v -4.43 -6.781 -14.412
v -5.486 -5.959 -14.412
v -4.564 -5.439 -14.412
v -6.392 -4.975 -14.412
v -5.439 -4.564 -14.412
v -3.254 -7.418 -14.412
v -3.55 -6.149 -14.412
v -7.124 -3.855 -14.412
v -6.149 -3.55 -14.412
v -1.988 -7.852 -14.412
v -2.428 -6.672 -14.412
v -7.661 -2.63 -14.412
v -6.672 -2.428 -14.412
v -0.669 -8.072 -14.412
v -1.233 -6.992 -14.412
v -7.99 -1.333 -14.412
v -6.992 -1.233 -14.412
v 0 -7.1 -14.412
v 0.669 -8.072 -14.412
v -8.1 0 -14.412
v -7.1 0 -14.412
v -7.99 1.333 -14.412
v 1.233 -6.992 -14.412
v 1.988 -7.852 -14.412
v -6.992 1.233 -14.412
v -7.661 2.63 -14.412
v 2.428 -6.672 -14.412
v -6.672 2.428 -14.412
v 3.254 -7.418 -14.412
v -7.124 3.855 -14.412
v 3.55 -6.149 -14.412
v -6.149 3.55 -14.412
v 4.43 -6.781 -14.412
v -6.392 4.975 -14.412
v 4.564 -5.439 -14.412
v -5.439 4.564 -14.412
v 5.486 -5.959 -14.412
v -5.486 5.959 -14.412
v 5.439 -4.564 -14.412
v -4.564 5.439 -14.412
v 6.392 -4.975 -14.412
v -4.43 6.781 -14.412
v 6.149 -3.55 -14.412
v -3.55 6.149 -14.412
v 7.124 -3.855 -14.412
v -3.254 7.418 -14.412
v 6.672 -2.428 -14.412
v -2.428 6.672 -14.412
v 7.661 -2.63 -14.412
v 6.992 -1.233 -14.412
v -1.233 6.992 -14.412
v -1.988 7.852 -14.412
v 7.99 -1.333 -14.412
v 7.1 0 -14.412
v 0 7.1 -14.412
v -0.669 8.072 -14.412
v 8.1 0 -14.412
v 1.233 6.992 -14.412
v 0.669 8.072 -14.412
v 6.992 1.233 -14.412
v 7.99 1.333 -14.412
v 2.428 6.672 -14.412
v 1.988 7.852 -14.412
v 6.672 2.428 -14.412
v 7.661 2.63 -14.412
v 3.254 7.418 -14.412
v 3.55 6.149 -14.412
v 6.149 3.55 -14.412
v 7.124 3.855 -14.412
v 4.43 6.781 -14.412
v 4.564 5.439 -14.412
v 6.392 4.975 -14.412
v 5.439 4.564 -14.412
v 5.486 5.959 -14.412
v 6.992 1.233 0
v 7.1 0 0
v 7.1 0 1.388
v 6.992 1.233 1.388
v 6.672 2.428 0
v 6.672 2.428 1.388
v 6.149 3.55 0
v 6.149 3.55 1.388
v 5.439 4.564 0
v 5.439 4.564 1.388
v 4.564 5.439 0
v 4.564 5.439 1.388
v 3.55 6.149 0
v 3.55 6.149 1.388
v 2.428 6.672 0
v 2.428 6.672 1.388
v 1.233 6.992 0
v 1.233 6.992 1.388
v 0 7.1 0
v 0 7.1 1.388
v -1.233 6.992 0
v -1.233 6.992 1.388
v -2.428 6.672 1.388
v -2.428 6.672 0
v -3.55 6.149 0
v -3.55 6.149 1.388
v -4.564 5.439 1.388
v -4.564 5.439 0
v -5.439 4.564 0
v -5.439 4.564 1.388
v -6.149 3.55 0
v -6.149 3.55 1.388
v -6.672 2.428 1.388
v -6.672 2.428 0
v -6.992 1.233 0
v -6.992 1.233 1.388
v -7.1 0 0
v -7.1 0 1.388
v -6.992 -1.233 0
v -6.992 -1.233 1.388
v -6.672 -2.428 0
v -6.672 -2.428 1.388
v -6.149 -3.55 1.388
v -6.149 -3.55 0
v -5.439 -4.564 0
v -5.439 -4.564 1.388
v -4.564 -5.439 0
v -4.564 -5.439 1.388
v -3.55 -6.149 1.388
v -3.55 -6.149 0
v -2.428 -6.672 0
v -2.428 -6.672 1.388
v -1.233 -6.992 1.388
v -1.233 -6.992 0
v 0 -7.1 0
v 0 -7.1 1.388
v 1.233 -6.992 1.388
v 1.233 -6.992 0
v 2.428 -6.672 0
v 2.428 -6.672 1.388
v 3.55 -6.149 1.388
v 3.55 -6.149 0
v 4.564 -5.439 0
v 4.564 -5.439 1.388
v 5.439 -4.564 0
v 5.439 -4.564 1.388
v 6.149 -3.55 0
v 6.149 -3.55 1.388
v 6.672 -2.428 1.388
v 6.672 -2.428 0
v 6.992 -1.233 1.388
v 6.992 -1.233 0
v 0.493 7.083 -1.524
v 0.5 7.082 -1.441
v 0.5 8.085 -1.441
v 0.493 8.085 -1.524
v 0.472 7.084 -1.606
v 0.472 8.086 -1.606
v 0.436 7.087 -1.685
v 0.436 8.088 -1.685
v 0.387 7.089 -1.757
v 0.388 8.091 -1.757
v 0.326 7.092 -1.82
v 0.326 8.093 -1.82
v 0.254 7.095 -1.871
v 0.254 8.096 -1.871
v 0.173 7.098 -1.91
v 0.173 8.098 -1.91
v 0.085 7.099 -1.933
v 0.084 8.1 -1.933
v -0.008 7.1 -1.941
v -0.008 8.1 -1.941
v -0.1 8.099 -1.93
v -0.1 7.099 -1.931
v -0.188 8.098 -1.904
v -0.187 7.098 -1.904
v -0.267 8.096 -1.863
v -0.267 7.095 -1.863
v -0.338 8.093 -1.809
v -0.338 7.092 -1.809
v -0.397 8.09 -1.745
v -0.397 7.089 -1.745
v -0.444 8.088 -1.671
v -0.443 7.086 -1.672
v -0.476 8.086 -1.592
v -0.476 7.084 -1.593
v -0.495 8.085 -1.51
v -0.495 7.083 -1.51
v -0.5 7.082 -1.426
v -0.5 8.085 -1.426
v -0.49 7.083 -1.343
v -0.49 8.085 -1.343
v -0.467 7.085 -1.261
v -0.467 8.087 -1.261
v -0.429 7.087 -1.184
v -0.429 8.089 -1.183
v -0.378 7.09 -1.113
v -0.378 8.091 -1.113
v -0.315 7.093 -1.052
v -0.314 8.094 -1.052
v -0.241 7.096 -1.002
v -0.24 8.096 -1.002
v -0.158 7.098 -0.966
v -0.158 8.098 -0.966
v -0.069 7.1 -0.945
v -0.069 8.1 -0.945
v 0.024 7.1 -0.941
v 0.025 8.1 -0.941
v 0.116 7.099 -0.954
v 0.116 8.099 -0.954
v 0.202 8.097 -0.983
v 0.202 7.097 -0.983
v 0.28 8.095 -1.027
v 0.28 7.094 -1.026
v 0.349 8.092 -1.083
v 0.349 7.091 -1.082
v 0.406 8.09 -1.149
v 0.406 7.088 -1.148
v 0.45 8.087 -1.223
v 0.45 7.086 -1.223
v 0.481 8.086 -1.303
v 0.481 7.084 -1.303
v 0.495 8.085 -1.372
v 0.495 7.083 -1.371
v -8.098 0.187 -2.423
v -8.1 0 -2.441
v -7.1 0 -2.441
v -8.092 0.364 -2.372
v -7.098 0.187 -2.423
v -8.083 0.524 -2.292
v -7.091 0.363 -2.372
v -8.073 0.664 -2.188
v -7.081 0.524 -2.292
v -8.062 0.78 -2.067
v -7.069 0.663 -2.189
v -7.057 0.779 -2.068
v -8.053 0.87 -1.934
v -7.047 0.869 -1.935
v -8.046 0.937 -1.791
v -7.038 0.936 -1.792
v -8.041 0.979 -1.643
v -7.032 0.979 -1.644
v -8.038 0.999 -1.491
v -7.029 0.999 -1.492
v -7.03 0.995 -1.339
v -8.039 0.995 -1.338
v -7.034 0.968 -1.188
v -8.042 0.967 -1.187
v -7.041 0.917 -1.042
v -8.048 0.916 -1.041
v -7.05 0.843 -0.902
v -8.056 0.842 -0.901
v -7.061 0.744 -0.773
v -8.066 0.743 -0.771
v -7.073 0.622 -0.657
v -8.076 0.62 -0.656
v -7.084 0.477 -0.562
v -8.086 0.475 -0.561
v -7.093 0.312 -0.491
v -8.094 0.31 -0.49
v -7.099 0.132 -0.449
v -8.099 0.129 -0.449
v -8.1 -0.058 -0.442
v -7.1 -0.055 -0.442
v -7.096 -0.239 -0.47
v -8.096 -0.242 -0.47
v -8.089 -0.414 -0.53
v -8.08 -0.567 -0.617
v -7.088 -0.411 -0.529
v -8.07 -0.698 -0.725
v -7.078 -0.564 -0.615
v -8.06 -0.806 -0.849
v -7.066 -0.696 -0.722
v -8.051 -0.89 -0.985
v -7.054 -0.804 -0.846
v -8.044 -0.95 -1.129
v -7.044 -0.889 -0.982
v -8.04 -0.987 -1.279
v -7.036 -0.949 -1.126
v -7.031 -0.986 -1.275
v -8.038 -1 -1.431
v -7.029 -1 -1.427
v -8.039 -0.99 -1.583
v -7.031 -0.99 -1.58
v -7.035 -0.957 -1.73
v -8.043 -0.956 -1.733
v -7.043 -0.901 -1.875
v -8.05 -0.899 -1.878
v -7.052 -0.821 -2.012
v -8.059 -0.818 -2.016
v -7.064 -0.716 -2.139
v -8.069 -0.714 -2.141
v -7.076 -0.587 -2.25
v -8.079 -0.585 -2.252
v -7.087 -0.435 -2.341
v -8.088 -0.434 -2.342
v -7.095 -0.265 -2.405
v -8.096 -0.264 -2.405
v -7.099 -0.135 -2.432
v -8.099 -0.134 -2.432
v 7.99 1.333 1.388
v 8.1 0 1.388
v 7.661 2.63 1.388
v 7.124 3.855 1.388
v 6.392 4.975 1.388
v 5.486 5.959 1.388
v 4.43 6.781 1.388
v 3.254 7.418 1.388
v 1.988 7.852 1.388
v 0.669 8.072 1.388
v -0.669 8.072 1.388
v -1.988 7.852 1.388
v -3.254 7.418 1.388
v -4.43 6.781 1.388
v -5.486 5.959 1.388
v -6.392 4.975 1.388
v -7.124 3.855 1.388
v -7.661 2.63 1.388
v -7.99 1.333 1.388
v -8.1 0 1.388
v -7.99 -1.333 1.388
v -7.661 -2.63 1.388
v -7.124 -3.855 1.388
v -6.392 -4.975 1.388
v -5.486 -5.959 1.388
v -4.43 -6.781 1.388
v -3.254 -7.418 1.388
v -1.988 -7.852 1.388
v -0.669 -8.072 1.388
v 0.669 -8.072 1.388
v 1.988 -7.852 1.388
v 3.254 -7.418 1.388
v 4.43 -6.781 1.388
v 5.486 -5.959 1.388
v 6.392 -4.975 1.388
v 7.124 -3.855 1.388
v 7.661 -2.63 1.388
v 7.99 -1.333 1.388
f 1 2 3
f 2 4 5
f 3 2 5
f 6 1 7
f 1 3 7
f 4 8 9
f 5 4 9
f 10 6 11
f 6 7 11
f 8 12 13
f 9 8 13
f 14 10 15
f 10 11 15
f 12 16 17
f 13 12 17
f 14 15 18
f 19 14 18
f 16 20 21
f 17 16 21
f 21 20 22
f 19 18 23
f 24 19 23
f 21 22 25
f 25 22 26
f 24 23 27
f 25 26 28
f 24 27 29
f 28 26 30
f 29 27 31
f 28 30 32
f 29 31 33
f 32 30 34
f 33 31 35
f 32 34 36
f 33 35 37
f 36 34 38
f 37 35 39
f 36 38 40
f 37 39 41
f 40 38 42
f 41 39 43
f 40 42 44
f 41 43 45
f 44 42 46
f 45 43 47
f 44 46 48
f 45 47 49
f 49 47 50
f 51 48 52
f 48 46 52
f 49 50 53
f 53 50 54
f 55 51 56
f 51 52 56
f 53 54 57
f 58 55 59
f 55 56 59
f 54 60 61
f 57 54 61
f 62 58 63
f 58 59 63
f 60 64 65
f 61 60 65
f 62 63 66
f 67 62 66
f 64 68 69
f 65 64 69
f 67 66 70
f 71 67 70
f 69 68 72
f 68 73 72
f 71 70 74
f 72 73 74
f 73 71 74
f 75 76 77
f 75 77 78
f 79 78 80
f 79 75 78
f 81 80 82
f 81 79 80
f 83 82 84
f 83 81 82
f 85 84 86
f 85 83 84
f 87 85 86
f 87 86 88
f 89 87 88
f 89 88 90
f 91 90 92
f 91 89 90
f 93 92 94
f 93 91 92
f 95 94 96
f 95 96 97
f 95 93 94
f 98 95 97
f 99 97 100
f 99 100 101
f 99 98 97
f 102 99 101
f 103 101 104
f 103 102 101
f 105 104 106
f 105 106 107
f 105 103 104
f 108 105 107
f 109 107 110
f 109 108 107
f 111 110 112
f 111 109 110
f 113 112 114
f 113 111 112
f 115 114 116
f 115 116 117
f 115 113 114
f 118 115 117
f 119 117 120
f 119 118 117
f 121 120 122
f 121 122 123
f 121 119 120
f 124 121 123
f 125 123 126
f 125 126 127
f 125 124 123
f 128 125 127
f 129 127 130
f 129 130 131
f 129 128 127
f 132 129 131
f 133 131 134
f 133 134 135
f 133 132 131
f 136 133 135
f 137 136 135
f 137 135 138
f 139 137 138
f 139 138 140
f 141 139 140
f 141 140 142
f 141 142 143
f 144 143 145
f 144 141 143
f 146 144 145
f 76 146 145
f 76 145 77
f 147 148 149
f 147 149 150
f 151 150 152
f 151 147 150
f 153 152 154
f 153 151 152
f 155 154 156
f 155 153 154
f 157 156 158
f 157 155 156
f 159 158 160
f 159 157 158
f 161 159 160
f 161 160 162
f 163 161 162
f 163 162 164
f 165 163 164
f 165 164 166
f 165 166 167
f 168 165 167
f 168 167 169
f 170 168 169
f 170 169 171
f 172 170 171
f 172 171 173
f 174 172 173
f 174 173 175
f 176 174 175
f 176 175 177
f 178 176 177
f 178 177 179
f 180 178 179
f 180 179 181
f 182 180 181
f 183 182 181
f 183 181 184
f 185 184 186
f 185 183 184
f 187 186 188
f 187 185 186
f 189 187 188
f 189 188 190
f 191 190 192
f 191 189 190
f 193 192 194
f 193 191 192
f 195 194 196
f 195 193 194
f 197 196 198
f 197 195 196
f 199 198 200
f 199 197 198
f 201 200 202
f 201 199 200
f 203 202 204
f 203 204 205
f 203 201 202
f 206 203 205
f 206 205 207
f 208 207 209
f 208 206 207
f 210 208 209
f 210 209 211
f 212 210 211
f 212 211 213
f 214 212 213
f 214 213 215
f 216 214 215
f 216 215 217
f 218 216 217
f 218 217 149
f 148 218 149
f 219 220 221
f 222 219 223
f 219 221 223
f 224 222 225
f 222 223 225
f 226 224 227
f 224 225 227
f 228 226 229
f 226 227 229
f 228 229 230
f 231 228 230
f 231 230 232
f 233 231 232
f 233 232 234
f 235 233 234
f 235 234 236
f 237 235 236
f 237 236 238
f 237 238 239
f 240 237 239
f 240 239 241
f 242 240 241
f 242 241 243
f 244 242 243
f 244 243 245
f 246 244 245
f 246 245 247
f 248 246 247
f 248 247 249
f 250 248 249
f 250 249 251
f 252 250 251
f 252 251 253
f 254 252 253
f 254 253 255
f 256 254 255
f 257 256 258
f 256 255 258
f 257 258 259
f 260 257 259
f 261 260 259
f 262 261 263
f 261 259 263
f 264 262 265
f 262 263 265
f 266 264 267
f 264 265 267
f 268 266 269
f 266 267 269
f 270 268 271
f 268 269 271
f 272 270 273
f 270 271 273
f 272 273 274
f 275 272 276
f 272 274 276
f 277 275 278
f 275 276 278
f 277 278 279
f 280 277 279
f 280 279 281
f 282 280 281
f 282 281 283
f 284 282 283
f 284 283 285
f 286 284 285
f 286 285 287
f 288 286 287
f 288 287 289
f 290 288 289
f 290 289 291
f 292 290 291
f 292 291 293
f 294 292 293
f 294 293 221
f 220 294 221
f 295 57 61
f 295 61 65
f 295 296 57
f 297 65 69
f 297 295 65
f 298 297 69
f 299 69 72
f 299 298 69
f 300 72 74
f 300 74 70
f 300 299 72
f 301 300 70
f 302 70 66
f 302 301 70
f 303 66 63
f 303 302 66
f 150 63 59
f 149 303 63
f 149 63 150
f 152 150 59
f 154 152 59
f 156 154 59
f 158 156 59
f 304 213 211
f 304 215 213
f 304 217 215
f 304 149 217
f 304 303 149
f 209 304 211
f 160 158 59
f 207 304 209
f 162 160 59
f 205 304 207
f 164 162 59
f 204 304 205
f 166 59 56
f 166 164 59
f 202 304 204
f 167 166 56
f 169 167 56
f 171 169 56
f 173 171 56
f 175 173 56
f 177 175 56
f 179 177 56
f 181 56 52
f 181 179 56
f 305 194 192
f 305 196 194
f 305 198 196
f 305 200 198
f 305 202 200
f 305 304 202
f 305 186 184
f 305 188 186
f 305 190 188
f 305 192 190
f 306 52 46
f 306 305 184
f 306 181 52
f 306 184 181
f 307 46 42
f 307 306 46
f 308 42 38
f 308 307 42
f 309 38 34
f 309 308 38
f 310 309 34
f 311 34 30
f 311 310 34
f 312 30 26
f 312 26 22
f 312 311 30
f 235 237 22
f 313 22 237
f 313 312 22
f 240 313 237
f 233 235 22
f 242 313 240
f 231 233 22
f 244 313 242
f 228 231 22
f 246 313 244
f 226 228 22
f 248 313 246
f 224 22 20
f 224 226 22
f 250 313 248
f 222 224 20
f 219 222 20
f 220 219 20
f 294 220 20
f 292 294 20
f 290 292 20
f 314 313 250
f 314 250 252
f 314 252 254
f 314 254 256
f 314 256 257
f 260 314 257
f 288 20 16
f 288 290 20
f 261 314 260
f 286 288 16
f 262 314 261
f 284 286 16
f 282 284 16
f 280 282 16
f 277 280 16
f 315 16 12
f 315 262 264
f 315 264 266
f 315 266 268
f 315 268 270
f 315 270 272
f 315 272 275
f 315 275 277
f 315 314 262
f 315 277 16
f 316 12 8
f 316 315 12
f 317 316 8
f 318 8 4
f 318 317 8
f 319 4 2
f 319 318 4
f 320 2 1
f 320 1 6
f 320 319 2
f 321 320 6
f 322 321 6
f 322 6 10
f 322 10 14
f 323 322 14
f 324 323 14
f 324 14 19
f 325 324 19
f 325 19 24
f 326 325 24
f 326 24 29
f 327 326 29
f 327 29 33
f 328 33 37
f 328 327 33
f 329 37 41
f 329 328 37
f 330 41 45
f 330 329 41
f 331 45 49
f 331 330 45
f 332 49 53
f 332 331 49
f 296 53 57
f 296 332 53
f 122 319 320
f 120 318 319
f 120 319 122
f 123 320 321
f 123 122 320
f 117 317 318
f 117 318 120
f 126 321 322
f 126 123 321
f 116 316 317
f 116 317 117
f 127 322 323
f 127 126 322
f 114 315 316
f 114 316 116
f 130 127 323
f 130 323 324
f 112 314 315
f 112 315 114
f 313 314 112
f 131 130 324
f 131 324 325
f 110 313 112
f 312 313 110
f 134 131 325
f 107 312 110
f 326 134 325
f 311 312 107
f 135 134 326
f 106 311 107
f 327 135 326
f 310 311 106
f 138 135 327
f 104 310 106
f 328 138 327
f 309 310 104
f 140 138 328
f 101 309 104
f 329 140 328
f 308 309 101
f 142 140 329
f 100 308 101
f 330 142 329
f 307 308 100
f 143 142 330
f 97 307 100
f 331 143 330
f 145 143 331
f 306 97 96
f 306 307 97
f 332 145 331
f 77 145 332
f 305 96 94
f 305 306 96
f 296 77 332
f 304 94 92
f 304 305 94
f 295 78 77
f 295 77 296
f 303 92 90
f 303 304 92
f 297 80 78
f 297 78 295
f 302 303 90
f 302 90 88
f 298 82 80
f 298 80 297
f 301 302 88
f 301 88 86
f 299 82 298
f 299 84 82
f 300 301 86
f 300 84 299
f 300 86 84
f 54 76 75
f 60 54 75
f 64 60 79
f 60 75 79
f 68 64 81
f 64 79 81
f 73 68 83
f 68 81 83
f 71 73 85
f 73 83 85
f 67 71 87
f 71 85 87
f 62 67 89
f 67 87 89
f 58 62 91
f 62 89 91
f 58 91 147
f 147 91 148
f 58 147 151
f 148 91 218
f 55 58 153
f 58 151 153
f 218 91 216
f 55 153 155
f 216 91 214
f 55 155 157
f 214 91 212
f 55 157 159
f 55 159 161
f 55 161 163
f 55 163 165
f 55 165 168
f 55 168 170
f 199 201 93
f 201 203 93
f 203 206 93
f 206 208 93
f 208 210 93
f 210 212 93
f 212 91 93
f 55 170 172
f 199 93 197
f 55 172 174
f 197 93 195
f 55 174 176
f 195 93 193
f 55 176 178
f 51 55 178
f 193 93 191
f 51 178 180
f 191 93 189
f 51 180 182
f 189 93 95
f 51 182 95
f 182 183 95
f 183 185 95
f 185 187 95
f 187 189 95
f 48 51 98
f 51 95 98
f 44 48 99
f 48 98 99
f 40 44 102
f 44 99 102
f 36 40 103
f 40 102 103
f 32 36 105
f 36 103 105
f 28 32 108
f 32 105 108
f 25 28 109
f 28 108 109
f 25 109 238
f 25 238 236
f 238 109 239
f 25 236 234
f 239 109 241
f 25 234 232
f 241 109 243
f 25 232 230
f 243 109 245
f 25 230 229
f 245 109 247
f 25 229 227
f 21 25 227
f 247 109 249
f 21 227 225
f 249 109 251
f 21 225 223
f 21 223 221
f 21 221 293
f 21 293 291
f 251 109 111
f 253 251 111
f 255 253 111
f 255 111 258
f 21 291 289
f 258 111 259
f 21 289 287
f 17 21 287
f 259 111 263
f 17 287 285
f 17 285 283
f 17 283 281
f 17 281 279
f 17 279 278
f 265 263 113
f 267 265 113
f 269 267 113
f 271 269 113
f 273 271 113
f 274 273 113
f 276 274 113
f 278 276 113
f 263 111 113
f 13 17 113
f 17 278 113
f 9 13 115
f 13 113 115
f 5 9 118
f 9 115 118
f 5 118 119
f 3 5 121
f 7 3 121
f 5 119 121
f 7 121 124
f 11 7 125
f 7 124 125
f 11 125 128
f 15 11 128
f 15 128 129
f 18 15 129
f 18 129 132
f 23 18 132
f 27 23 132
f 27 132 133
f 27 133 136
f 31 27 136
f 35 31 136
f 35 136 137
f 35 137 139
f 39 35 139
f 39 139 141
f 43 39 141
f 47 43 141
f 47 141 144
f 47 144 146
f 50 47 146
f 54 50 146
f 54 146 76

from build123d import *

# Parameters (mm, degrees)
SKETCH1_R                = 8.1
SKETCH1_R_2              = 7.1
BOSS_EXTRUDE1_DEPTH      = 1.3875
BOSS_EXTRUDE1_DEPTH_BACK = 14.4125
SKETCH3_R                = 1
CUT_EXTRUDE1_DEPTH       = 9.1
SKETCH4_R                = 0.5
CUT_EXTRUDE2_DEPTH       = 9.1000001


with BuildPart() as part:
    # Sketch1 → Boss-Extrude1 (new body, two sides)
    with BuildSketch(Plane.XY) as boss_extrude1_sk:
        Circle(SKETCH1_R)
        Circle(SKETCH1_R_2, mode=Mode.SUBTRACT)
    extrude(amount=BOSS_EXTRUDE1_DEPTH)
    extrude(boss_extrude1_sk.sketch, amount=-BOSS_EXTRUDE1_DEPTH_BACK)

    # Sketch3 → Cut-Extrude1 (cut, through all)
    with BuildSketch(Plane(origin=(0, 0, 0), x_dir=(0, 0, -1), z_dir=(1, 0, 0))):
        with Locations((1.440651468, 0)):
            Circle(SKETCH3_R)
    extrude(amount=-CUT_EXTRUDE1_DEPTH, mode=Mode.SUBTRACT)

    # Sketch4 → Cut-Extrude2 (cut, through all)
    with BuildSketch(Plane(origin=(0, 0, 0), x_dir=(1, 0, 0), z_dir=(0, 1, 0))):
        with Locations((0, 1.440651468)):
            Circle(SKETCH4_R)
    extrude(amount=CUT_EXTRUDE2_DEPTH, mode=Mode.SUBTRACT)


solid = part.part
